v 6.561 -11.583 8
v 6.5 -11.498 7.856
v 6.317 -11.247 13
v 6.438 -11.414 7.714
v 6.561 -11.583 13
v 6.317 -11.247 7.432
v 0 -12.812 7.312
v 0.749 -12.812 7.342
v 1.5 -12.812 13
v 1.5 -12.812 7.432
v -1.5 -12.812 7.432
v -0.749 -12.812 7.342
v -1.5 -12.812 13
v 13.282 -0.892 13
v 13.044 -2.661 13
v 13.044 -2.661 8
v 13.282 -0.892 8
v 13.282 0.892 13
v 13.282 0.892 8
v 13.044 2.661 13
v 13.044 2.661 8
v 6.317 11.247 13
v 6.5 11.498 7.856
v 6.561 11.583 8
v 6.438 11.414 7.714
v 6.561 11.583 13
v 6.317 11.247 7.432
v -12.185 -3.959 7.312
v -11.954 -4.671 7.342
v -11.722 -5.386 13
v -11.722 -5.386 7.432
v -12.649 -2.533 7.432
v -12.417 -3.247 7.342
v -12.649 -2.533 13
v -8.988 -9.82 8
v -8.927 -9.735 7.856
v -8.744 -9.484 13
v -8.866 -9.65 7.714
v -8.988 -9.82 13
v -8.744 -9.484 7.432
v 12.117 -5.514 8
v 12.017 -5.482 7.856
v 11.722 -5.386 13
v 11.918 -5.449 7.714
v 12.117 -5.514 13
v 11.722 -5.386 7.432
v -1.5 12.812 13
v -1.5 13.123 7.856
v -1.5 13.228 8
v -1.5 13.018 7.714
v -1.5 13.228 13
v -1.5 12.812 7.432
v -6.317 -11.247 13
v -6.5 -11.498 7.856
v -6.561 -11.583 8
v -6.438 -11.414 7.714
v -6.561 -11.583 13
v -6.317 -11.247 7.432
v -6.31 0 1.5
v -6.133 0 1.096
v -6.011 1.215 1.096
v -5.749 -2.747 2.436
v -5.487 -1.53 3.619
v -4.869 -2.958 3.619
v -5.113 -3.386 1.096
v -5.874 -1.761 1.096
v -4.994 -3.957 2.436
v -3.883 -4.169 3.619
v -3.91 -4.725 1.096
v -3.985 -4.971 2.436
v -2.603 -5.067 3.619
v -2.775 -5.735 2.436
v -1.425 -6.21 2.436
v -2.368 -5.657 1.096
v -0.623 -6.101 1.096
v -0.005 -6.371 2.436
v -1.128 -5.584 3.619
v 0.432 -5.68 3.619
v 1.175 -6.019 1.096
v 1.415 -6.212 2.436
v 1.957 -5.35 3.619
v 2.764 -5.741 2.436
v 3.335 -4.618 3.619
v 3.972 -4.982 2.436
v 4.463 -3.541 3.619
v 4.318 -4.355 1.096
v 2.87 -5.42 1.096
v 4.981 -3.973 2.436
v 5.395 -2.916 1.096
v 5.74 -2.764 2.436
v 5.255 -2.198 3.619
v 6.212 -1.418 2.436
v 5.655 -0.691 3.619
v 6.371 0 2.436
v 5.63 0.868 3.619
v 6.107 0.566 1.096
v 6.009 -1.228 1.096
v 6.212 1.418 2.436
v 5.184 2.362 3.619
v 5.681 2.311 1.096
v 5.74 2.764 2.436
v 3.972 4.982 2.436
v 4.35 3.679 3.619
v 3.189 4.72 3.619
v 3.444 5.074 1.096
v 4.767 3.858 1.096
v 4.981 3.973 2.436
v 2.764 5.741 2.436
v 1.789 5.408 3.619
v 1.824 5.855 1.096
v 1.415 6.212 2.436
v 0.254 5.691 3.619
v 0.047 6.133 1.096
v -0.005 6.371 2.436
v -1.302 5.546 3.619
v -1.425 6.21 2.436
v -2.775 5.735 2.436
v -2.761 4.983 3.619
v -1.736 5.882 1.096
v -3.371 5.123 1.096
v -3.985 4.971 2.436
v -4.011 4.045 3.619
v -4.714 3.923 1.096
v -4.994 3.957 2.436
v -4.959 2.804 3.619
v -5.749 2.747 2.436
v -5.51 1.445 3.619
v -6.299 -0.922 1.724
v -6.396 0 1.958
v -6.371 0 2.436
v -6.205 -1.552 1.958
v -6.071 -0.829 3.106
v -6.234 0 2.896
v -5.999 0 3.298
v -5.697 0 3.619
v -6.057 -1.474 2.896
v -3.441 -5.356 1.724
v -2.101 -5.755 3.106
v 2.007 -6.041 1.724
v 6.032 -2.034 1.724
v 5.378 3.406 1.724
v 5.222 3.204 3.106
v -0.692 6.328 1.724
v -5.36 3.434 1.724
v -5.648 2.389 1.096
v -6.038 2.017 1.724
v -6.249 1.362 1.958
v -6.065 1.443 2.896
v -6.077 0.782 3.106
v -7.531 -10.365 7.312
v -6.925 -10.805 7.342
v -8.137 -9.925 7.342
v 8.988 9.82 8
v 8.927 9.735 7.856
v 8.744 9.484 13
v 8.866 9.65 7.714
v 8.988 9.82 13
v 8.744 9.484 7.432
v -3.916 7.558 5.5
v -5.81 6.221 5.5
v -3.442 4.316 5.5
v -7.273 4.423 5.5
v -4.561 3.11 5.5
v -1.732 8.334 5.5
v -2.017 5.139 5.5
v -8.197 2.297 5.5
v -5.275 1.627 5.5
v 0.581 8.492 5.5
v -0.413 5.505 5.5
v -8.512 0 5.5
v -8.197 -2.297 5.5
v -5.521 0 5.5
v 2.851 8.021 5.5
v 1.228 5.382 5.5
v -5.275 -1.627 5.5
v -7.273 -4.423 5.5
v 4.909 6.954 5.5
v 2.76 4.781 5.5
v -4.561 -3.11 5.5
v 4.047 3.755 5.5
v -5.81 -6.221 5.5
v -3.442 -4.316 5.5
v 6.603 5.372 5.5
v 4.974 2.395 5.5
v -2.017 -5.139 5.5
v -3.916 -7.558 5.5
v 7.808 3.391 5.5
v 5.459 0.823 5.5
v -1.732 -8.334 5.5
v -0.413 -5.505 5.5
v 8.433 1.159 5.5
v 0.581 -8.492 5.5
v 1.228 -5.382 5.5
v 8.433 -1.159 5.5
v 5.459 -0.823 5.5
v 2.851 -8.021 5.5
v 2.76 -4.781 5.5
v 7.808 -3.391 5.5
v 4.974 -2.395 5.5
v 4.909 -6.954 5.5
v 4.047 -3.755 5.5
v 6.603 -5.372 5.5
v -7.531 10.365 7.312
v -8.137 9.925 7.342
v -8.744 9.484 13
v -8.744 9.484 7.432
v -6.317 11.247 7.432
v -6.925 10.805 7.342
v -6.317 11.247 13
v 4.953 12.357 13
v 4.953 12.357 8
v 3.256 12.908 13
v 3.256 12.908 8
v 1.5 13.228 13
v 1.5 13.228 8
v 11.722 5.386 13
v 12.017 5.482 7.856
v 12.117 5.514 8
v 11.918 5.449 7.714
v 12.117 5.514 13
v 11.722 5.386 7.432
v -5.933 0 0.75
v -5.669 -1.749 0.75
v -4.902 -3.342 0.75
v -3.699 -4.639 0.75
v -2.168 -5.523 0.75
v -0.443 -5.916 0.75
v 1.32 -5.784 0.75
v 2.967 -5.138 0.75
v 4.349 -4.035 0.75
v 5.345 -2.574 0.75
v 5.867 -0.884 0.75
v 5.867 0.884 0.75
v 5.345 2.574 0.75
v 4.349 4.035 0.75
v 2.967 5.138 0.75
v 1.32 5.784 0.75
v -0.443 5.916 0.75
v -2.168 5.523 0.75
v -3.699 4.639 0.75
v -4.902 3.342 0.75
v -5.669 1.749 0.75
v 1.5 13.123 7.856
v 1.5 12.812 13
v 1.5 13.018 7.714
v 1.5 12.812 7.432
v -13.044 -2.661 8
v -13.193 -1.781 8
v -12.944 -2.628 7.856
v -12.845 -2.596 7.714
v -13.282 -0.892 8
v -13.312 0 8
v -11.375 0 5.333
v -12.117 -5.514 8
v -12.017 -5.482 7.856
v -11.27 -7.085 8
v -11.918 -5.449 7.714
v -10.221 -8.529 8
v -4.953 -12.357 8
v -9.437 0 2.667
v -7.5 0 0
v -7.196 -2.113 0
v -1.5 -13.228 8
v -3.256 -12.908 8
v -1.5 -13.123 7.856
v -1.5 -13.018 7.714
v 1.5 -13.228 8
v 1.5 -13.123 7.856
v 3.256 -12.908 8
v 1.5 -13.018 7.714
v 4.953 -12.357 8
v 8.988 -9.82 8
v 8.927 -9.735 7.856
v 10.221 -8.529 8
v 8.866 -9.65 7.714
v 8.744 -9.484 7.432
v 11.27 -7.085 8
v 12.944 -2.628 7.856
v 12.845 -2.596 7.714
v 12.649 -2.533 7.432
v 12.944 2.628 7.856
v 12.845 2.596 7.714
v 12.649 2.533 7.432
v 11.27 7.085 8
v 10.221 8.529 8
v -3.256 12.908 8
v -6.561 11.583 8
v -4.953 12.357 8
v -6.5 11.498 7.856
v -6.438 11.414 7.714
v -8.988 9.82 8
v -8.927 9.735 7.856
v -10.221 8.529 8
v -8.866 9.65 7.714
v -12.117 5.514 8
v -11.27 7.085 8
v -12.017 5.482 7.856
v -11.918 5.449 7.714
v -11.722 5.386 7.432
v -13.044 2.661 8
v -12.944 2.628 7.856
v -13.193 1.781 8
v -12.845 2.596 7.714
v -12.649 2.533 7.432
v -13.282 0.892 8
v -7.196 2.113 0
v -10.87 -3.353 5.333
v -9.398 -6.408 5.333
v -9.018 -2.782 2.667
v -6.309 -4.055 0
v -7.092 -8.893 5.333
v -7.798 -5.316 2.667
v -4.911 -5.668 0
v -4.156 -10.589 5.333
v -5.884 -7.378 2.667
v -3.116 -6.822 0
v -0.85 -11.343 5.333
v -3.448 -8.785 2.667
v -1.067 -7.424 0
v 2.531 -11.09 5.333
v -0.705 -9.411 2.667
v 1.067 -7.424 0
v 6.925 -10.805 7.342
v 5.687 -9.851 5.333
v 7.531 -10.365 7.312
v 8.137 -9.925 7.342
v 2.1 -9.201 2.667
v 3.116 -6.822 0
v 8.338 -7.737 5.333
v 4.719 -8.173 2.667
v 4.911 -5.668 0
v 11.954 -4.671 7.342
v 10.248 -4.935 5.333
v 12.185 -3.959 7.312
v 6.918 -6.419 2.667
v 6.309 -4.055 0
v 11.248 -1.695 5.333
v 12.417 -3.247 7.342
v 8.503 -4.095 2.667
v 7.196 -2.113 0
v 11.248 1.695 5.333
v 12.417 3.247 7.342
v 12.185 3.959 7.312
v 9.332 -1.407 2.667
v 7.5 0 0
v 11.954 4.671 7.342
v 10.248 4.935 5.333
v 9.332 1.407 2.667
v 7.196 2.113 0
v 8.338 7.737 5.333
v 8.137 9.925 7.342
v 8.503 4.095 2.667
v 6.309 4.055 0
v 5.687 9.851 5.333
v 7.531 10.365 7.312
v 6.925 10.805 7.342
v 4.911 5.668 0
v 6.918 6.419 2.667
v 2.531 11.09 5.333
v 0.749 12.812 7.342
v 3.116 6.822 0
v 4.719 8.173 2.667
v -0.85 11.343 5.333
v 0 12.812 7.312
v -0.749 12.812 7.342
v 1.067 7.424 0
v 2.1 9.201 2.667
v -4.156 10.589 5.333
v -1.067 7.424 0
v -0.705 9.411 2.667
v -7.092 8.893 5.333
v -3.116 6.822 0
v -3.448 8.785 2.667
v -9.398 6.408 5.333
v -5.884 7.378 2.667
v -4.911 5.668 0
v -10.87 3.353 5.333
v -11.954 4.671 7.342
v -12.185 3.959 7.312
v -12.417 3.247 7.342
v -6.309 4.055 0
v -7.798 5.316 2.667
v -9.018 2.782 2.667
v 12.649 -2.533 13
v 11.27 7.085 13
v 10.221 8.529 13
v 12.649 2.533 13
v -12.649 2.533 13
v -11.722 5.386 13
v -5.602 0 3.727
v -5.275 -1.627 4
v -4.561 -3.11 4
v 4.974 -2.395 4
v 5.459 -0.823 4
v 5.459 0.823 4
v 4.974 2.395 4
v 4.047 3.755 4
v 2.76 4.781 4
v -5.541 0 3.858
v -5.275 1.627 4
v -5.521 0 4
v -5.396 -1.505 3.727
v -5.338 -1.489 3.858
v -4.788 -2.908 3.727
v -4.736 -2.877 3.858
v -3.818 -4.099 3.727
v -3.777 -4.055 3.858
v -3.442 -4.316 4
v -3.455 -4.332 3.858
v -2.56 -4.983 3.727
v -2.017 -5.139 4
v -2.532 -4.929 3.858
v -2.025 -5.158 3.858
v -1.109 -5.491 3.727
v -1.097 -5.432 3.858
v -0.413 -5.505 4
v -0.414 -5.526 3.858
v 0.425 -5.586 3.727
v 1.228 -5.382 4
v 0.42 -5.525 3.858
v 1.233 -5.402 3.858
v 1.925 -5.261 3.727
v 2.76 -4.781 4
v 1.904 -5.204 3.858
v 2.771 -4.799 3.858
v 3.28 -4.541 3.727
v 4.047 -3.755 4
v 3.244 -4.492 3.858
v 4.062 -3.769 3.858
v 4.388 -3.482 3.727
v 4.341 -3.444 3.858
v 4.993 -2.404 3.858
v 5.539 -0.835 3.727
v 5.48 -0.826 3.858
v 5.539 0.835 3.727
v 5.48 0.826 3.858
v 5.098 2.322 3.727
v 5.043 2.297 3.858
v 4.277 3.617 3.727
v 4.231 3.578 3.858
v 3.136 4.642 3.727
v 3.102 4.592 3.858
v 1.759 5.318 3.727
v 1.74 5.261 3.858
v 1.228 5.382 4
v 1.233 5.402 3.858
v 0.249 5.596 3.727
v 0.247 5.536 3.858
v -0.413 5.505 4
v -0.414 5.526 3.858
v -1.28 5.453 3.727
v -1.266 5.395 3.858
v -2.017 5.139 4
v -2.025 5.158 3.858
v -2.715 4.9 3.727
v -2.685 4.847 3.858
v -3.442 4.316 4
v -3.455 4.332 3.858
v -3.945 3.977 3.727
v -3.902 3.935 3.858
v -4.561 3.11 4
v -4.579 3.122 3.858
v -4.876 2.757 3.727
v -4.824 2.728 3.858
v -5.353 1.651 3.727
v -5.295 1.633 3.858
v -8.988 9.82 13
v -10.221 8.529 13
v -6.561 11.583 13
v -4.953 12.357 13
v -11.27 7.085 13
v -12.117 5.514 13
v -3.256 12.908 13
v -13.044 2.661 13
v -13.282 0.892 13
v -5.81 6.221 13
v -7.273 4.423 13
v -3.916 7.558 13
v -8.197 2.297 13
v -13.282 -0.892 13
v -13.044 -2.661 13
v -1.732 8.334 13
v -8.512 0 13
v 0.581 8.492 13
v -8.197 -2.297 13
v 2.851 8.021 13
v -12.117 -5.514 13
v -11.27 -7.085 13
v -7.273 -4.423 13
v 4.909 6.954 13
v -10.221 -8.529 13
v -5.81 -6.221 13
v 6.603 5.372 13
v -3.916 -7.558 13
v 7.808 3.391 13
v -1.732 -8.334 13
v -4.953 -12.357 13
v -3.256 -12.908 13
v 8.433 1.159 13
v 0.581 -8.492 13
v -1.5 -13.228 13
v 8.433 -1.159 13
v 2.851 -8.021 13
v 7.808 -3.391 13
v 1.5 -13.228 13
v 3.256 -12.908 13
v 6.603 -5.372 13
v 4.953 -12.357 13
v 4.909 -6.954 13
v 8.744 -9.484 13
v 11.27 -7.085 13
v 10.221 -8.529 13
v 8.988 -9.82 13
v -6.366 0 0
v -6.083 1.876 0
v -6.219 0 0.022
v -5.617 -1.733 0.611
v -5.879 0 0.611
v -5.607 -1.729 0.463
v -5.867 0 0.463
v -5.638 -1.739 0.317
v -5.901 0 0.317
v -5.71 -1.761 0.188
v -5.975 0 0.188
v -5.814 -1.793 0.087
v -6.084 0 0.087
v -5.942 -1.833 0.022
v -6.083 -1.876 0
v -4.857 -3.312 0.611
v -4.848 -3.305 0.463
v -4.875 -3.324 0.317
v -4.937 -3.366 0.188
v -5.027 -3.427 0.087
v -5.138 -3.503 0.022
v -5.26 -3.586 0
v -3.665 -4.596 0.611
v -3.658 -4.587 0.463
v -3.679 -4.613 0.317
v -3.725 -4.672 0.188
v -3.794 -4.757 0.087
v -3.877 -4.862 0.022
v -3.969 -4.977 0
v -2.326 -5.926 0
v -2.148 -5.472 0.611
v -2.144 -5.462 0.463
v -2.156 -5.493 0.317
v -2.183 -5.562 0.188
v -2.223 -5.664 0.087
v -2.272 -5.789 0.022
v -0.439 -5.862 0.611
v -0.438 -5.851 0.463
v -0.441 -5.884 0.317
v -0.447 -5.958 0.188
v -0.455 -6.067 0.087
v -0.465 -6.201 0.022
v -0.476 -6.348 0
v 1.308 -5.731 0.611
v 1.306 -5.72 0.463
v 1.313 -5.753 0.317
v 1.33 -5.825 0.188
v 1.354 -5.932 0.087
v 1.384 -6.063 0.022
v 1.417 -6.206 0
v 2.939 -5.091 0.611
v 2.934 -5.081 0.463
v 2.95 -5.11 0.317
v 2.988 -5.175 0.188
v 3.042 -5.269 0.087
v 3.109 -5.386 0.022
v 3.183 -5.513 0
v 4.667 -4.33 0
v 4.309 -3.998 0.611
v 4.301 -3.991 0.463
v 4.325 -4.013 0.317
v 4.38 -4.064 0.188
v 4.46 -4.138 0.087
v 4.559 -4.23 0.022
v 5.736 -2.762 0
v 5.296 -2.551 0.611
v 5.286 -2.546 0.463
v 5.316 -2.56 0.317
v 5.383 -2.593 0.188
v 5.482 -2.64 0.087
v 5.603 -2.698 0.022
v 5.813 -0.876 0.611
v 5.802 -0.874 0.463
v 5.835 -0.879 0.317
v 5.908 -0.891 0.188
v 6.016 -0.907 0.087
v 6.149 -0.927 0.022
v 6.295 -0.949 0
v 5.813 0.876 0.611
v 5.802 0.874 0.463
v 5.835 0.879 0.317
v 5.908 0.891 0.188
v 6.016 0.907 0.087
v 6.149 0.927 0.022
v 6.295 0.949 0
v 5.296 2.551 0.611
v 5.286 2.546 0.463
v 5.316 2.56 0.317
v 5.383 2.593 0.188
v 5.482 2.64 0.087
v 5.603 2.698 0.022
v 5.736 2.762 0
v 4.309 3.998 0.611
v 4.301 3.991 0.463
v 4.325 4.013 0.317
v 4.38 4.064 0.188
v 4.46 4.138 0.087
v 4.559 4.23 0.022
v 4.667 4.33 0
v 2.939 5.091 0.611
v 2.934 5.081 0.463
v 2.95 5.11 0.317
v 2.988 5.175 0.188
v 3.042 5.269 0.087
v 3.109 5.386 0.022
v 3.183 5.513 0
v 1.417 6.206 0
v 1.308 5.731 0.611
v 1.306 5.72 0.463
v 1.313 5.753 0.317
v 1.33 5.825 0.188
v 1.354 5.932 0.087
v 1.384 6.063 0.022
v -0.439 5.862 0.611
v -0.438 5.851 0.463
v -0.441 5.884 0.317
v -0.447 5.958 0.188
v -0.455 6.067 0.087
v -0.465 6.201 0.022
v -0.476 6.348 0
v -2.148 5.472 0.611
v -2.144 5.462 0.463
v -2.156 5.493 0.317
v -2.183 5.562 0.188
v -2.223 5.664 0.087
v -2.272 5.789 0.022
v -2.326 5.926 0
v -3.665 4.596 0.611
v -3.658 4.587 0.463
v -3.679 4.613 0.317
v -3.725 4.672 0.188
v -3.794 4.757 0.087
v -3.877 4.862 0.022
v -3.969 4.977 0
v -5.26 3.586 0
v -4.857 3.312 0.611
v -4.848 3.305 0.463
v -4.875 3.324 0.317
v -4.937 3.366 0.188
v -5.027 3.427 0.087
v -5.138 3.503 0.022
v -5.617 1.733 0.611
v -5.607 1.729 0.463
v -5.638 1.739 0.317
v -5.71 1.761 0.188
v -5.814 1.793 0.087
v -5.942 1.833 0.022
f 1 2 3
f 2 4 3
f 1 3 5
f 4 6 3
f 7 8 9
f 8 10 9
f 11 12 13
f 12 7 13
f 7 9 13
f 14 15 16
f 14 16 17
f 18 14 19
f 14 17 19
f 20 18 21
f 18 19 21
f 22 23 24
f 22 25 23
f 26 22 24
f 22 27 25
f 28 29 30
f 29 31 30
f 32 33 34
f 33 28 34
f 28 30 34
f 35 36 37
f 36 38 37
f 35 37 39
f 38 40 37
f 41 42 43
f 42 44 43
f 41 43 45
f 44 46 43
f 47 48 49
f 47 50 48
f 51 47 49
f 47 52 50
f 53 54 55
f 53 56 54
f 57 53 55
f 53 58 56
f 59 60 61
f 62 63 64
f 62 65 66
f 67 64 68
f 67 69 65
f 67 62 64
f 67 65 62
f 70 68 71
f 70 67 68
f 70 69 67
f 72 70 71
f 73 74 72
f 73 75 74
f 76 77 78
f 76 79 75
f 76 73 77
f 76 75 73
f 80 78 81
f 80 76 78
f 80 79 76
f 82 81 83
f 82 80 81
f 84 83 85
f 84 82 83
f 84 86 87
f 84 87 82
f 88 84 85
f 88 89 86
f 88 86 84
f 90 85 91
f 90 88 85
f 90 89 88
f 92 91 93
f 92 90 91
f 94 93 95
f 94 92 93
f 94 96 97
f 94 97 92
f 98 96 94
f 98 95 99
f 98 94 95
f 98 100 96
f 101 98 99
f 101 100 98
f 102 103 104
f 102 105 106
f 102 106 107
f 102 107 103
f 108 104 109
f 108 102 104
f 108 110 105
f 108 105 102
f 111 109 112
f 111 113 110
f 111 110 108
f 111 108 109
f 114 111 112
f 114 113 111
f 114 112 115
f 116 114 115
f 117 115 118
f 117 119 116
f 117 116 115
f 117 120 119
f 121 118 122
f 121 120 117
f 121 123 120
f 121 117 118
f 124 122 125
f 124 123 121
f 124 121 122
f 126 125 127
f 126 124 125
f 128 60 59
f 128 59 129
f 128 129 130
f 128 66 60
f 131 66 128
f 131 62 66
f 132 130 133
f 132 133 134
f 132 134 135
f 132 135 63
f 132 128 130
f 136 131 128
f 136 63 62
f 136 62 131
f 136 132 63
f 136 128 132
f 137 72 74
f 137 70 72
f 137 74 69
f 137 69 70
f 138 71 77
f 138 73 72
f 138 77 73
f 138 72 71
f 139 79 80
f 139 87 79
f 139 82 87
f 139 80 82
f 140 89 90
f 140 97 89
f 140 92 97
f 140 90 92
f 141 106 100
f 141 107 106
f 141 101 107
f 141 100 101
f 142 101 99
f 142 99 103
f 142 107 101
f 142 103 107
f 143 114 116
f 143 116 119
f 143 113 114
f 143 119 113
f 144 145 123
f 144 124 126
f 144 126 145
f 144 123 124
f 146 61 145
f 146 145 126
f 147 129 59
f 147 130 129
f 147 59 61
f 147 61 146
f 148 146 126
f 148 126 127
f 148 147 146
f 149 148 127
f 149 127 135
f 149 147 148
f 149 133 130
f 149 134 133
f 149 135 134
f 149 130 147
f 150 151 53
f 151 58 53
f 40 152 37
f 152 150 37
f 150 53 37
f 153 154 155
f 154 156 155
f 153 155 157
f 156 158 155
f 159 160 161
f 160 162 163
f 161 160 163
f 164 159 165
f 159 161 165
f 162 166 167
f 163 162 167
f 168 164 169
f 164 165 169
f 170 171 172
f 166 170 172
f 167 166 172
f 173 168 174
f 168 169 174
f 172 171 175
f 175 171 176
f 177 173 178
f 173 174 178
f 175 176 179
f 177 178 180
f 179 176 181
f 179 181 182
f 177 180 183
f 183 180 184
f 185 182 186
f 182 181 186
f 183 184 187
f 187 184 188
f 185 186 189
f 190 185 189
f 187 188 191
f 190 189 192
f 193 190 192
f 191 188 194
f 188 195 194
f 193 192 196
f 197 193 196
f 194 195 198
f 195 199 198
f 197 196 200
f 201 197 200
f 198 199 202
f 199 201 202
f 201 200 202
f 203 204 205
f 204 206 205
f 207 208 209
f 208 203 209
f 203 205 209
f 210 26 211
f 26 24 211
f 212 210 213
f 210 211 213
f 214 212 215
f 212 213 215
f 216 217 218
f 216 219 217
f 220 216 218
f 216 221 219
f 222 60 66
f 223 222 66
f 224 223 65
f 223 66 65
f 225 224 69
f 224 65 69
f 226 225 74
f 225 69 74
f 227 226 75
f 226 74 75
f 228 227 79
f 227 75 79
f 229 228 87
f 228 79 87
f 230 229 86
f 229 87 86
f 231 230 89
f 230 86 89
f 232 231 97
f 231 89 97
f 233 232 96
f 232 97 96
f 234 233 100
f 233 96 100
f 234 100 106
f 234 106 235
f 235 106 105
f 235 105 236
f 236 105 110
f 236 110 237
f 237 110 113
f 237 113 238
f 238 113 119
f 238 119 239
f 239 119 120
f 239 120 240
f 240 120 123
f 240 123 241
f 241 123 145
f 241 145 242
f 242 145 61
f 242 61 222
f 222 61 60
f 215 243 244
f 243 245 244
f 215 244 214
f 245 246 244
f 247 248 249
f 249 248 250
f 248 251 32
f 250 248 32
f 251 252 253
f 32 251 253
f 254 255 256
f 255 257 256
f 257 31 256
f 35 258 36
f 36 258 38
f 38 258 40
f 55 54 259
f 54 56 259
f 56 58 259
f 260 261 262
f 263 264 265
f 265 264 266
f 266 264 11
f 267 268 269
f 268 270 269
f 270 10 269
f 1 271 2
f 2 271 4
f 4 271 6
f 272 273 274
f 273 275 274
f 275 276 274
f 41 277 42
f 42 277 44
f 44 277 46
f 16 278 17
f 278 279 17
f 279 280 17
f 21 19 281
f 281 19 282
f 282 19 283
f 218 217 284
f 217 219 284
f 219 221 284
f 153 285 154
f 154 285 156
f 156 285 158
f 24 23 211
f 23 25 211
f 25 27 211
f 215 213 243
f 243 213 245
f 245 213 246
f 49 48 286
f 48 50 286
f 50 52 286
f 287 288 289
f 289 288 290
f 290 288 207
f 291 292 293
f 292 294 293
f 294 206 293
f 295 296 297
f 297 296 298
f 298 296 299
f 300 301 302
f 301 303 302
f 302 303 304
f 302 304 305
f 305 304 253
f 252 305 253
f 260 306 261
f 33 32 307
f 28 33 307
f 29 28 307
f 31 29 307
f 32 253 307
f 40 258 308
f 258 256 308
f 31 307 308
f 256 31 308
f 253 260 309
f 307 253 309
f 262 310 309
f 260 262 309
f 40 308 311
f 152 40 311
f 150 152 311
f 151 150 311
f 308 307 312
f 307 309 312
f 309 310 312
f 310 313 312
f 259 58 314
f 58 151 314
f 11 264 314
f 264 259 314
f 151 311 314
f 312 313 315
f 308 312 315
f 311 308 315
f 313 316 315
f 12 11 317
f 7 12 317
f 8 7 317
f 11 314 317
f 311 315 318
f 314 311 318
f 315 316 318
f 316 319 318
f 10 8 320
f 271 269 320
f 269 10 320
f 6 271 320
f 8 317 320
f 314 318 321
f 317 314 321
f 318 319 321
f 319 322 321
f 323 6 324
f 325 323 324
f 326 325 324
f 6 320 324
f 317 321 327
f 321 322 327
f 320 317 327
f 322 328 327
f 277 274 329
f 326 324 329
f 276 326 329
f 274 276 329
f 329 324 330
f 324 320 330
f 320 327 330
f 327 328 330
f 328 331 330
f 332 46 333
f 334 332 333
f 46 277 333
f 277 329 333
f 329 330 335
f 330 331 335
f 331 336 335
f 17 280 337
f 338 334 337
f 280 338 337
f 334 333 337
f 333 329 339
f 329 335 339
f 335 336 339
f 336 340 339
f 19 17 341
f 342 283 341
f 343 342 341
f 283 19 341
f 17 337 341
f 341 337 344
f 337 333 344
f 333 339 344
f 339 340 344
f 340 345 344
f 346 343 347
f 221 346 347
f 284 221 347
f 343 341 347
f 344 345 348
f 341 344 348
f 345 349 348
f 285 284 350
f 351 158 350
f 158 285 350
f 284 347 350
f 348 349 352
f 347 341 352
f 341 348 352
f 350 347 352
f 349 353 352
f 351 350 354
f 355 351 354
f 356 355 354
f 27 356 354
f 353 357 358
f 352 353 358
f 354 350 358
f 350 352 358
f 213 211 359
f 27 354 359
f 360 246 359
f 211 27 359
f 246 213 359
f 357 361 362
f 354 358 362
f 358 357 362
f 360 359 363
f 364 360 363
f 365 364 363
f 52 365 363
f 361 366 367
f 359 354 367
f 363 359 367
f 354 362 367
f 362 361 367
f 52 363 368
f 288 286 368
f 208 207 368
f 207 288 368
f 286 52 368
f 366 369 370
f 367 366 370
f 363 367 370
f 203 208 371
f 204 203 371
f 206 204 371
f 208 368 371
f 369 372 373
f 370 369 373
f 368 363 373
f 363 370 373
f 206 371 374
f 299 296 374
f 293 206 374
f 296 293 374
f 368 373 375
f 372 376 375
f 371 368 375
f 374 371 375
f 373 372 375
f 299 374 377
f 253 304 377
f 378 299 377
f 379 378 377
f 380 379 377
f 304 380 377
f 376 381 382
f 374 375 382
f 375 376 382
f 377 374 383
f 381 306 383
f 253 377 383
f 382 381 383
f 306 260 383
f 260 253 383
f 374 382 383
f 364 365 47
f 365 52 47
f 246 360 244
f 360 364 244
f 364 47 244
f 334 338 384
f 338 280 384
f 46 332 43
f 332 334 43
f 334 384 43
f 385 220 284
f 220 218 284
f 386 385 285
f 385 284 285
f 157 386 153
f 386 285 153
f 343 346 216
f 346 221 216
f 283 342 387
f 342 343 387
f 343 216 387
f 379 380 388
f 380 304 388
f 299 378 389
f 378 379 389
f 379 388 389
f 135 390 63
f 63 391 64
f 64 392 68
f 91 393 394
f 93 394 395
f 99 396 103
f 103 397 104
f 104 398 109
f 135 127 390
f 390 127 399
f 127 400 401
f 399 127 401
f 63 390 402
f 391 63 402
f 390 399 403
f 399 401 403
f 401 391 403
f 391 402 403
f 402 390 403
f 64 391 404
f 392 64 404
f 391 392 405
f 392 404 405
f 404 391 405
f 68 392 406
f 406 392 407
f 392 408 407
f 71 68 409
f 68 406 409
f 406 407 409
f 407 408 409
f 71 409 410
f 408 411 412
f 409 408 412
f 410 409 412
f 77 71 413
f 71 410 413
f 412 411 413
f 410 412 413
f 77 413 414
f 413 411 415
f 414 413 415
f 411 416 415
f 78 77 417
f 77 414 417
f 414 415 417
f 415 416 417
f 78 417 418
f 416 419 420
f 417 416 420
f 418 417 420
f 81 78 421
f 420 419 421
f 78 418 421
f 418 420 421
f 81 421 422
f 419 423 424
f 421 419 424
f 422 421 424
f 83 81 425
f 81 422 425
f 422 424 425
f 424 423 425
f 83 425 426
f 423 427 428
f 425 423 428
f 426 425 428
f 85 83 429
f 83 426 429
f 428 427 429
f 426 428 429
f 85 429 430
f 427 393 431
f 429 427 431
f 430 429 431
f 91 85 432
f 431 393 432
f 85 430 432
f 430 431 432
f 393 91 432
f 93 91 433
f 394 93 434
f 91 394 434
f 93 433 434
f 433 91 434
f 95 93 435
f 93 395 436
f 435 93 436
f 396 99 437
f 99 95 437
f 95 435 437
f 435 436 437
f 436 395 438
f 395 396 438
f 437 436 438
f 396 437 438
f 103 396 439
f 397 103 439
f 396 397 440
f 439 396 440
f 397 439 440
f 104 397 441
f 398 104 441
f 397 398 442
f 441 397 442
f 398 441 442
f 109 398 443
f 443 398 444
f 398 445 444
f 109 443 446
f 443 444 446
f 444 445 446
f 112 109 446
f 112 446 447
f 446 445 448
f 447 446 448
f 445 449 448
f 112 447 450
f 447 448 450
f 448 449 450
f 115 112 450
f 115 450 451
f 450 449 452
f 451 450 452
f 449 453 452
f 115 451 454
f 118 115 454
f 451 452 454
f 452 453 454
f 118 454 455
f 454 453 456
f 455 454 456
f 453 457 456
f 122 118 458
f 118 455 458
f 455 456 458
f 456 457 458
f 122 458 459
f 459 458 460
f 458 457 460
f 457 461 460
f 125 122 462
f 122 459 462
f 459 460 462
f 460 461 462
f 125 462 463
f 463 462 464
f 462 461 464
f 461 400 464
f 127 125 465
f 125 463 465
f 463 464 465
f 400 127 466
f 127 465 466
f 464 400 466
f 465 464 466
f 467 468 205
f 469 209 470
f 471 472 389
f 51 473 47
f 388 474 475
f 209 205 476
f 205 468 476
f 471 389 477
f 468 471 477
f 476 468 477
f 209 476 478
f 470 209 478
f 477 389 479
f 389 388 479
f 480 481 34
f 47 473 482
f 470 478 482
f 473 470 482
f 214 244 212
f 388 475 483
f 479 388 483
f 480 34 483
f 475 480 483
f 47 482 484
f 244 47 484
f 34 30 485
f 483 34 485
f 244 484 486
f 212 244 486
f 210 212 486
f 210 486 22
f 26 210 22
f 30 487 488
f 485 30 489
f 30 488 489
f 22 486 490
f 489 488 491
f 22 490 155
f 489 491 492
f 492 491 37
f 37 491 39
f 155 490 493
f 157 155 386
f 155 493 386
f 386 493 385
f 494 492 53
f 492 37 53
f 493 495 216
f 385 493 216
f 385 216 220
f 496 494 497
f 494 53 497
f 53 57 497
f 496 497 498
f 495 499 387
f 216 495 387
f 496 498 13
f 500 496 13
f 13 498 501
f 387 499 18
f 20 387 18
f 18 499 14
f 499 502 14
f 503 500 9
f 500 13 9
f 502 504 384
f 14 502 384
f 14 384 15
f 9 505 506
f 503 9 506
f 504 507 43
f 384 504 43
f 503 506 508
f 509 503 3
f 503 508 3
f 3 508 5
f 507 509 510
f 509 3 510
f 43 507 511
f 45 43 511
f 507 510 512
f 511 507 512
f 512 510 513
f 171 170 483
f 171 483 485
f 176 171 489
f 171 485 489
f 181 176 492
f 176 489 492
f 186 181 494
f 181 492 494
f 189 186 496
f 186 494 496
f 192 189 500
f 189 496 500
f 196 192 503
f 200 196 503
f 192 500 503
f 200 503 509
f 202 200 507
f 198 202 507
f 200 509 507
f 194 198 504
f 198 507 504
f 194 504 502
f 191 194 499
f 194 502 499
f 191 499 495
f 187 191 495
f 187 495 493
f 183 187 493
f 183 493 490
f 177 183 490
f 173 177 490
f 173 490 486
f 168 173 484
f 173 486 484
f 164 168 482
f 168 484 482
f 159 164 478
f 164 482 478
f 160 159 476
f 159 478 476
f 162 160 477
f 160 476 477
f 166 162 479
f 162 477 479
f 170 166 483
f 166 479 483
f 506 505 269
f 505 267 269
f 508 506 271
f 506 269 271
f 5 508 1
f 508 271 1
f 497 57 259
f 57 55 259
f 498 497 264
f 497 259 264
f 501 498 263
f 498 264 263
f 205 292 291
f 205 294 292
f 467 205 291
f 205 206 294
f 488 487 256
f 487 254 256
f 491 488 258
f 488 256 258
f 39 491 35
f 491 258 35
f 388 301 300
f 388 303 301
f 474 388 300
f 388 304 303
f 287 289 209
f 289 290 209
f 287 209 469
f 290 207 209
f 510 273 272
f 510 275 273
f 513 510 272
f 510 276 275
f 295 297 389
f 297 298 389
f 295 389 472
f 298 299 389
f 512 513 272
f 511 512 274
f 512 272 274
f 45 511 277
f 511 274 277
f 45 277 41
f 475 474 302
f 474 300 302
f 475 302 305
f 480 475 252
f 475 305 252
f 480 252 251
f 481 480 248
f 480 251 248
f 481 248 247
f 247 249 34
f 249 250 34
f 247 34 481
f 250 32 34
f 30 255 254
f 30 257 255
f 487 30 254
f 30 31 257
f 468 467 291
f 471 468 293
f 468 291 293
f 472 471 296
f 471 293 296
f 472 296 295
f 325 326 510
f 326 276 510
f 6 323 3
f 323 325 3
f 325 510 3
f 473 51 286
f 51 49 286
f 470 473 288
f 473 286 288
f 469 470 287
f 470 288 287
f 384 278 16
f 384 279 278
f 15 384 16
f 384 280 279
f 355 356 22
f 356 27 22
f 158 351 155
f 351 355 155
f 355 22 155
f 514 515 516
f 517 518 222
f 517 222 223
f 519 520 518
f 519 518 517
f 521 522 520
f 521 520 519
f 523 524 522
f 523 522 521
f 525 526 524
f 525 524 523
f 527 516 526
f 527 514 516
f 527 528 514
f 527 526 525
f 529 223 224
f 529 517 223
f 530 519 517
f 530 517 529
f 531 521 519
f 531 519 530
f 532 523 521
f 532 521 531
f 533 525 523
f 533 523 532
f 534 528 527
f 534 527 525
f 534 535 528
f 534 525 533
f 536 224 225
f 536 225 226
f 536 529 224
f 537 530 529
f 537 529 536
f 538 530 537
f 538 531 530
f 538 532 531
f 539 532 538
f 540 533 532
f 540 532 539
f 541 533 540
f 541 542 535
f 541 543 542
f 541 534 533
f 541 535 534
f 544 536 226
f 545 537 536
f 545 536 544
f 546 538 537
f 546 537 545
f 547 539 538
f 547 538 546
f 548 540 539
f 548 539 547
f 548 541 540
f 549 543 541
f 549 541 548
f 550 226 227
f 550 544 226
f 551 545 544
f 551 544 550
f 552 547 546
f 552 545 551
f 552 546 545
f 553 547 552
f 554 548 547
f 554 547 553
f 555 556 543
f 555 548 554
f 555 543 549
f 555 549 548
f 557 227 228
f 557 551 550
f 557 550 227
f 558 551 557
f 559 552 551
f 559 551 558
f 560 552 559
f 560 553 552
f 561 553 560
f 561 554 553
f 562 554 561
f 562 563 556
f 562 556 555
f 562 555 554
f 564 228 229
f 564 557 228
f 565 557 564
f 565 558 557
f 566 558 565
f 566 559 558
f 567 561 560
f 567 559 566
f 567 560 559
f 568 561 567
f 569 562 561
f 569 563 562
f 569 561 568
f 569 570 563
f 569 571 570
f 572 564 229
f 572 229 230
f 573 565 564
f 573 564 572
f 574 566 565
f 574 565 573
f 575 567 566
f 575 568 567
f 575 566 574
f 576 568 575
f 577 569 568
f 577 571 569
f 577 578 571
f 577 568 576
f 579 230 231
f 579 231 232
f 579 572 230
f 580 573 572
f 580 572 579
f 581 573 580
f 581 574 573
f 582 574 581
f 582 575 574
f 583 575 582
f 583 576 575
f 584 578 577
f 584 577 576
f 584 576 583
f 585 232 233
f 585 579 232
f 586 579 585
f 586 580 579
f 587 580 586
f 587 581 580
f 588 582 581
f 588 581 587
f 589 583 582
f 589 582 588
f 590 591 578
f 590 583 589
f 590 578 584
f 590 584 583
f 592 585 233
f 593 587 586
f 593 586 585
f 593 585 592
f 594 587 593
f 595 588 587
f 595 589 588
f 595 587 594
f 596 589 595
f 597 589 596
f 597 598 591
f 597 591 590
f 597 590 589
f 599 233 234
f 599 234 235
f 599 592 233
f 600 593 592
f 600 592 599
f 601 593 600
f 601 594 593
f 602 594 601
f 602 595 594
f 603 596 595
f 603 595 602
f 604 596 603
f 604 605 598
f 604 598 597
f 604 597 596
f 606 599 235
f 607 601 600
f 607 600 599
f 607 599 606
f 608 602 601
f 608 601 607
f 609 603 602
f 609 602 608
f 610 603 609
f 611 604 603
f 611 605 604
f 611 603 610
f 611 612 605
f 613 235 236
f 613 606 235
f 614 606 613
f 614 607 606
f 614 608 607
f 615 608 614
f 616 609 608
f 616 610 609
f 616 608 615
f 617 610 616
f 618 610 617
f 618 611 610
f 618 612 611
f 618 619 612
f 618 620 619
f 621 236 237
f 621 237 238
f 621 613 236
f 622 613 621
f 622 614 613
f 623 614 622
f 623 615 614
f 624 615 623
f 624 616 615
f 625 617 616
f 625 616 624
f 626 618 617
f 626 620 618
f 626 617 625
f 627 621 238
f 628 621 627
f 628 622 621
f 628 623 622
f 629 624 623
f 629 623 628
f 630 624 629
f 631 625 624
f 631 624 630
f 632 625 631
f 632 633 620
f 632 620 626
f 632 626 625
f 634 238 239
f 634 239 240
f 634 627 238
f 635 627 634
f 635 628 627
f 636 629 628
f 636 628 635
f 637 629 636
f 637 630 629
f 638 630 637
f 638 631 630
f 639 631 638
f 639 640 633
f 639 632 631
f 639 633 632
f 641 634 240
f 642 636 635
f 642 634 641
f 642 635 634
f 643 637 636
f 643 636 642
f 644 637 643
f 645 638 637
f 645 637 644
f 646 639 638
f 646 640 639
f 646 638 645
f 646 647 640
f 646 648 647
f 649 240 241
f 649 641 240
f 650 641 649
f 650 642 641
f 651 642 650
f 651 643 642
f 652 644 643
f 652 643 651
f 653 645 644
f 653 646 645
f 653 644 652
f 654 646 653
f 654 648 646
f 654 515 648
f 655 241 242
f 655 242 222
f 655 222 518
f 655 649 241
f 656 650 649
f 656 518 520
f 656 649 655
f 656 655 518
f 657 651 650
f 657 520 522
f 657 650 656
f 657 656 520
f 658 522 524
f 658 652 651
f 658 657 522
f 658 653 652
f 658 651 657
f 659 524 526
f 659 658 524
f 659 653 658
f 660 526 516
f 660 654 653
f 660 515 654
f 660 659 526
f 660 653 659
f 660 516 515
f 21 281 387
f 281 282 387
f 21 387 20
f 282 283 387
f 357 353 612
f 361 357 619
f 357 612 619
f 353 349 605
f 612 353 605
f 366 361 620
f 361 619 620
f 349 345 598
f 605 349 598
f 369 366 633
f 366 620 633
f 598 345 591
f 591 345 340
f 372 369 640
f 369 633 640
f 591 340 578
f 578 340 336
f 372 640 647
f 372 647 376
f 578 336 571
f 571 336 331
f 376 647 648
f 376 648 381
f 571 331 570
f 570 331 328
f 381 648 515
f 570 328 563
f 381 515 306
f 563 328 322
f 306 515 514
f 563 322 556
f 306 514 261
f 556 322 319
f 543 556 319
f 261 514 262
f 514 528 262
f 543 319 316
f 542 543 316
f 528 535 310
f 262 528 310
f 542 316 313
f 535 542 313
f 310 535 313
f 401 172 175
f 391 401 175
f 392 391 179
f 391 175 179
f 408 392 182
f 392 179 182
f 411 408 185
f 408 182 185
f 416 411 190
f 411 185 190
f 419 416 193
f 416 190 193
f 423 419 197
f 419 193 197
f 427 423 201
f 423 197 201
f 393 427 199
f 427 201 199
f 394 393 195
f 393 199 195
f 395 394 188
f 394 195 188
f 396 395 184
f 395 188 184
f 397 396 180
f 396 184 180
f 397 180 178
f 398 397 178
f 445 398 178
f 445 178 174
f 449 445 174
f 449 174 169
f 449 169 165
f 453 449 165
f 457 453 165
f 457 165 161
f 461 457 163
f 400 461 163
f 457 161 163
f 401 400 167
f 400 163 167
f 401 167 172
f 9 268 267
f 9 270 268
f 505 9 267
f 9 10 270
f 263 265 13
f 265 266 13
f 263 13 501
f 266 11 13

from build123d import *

# Parameters (mm, degrees)
SKETCH005_W        = 3
SKETCH005_H        = 1
POCKET002_DEPTH    = 92.668992
POLARPATTERN_COUNT = 10
FILLET_R           = 0.5
FILLET004_R        = 2


with BuildPart() as part:
    # Sketch003 → Revolution (revolve)
    with BuildSketch(Plane.XZ):
        Polygon((-5.5, 0), (-7.520726, 3.5), (-5.520726, 3.5), (-5.520726, 5.5), (-8.51234, 5.5), (-8.51234, 8), (-8.51234, 13), (-11.31234, 13), (-13.31234, 13), (-13.31234, 8), (-7.5, 0), align=None)
    revolve(axis=Axis((0, 0, 0), (0, 0, 1)))

    # Sketch005 (on Face1 of Revolution) → Pocket002 (cut, through all)
    with BuildSketch(Plane(origin=(0, 0, 13), x_dir=(-1, 0, 0), z_dir=(0, 0, 1))):
        with Locations((0, 13.31234)):
            Rectangle(SKETCH005_W, SKETCH005_H)
    pocket002 = extrude(amount=-POCKET002_DEPTH, mode=Mode.SUBTRACT)

    # PolarPattern: Pocket002 ×10 about axis
    polarpattern_axis = Axis((0, 0, 13), (0, 0, 1))
    for i in range(1, POLARPATTERN_COUNT):
        add(pocket002.rotate(polarpattern_axis, i * 360 / POLARPATTERN_COUNT), mode=Mode.SUBTRACT)

    # Fillet
    fillet_edges = [part.edges().sort_by_distance(p)[0] for p in [
        (5.520726, 0, 3.5),
        (5.5, 0, 0),
    ]]
    fillet(fillet_edges, radius=FILLET_R)

    # Fillet004
    fillet004_edges = [part.edges().sort_by_distance(p)[0] for p in [
        (7.520726, 0, 3.5),
    ]]
    fillet(fillet004_edges, radius=FILLET004_R)


solid = part.part
